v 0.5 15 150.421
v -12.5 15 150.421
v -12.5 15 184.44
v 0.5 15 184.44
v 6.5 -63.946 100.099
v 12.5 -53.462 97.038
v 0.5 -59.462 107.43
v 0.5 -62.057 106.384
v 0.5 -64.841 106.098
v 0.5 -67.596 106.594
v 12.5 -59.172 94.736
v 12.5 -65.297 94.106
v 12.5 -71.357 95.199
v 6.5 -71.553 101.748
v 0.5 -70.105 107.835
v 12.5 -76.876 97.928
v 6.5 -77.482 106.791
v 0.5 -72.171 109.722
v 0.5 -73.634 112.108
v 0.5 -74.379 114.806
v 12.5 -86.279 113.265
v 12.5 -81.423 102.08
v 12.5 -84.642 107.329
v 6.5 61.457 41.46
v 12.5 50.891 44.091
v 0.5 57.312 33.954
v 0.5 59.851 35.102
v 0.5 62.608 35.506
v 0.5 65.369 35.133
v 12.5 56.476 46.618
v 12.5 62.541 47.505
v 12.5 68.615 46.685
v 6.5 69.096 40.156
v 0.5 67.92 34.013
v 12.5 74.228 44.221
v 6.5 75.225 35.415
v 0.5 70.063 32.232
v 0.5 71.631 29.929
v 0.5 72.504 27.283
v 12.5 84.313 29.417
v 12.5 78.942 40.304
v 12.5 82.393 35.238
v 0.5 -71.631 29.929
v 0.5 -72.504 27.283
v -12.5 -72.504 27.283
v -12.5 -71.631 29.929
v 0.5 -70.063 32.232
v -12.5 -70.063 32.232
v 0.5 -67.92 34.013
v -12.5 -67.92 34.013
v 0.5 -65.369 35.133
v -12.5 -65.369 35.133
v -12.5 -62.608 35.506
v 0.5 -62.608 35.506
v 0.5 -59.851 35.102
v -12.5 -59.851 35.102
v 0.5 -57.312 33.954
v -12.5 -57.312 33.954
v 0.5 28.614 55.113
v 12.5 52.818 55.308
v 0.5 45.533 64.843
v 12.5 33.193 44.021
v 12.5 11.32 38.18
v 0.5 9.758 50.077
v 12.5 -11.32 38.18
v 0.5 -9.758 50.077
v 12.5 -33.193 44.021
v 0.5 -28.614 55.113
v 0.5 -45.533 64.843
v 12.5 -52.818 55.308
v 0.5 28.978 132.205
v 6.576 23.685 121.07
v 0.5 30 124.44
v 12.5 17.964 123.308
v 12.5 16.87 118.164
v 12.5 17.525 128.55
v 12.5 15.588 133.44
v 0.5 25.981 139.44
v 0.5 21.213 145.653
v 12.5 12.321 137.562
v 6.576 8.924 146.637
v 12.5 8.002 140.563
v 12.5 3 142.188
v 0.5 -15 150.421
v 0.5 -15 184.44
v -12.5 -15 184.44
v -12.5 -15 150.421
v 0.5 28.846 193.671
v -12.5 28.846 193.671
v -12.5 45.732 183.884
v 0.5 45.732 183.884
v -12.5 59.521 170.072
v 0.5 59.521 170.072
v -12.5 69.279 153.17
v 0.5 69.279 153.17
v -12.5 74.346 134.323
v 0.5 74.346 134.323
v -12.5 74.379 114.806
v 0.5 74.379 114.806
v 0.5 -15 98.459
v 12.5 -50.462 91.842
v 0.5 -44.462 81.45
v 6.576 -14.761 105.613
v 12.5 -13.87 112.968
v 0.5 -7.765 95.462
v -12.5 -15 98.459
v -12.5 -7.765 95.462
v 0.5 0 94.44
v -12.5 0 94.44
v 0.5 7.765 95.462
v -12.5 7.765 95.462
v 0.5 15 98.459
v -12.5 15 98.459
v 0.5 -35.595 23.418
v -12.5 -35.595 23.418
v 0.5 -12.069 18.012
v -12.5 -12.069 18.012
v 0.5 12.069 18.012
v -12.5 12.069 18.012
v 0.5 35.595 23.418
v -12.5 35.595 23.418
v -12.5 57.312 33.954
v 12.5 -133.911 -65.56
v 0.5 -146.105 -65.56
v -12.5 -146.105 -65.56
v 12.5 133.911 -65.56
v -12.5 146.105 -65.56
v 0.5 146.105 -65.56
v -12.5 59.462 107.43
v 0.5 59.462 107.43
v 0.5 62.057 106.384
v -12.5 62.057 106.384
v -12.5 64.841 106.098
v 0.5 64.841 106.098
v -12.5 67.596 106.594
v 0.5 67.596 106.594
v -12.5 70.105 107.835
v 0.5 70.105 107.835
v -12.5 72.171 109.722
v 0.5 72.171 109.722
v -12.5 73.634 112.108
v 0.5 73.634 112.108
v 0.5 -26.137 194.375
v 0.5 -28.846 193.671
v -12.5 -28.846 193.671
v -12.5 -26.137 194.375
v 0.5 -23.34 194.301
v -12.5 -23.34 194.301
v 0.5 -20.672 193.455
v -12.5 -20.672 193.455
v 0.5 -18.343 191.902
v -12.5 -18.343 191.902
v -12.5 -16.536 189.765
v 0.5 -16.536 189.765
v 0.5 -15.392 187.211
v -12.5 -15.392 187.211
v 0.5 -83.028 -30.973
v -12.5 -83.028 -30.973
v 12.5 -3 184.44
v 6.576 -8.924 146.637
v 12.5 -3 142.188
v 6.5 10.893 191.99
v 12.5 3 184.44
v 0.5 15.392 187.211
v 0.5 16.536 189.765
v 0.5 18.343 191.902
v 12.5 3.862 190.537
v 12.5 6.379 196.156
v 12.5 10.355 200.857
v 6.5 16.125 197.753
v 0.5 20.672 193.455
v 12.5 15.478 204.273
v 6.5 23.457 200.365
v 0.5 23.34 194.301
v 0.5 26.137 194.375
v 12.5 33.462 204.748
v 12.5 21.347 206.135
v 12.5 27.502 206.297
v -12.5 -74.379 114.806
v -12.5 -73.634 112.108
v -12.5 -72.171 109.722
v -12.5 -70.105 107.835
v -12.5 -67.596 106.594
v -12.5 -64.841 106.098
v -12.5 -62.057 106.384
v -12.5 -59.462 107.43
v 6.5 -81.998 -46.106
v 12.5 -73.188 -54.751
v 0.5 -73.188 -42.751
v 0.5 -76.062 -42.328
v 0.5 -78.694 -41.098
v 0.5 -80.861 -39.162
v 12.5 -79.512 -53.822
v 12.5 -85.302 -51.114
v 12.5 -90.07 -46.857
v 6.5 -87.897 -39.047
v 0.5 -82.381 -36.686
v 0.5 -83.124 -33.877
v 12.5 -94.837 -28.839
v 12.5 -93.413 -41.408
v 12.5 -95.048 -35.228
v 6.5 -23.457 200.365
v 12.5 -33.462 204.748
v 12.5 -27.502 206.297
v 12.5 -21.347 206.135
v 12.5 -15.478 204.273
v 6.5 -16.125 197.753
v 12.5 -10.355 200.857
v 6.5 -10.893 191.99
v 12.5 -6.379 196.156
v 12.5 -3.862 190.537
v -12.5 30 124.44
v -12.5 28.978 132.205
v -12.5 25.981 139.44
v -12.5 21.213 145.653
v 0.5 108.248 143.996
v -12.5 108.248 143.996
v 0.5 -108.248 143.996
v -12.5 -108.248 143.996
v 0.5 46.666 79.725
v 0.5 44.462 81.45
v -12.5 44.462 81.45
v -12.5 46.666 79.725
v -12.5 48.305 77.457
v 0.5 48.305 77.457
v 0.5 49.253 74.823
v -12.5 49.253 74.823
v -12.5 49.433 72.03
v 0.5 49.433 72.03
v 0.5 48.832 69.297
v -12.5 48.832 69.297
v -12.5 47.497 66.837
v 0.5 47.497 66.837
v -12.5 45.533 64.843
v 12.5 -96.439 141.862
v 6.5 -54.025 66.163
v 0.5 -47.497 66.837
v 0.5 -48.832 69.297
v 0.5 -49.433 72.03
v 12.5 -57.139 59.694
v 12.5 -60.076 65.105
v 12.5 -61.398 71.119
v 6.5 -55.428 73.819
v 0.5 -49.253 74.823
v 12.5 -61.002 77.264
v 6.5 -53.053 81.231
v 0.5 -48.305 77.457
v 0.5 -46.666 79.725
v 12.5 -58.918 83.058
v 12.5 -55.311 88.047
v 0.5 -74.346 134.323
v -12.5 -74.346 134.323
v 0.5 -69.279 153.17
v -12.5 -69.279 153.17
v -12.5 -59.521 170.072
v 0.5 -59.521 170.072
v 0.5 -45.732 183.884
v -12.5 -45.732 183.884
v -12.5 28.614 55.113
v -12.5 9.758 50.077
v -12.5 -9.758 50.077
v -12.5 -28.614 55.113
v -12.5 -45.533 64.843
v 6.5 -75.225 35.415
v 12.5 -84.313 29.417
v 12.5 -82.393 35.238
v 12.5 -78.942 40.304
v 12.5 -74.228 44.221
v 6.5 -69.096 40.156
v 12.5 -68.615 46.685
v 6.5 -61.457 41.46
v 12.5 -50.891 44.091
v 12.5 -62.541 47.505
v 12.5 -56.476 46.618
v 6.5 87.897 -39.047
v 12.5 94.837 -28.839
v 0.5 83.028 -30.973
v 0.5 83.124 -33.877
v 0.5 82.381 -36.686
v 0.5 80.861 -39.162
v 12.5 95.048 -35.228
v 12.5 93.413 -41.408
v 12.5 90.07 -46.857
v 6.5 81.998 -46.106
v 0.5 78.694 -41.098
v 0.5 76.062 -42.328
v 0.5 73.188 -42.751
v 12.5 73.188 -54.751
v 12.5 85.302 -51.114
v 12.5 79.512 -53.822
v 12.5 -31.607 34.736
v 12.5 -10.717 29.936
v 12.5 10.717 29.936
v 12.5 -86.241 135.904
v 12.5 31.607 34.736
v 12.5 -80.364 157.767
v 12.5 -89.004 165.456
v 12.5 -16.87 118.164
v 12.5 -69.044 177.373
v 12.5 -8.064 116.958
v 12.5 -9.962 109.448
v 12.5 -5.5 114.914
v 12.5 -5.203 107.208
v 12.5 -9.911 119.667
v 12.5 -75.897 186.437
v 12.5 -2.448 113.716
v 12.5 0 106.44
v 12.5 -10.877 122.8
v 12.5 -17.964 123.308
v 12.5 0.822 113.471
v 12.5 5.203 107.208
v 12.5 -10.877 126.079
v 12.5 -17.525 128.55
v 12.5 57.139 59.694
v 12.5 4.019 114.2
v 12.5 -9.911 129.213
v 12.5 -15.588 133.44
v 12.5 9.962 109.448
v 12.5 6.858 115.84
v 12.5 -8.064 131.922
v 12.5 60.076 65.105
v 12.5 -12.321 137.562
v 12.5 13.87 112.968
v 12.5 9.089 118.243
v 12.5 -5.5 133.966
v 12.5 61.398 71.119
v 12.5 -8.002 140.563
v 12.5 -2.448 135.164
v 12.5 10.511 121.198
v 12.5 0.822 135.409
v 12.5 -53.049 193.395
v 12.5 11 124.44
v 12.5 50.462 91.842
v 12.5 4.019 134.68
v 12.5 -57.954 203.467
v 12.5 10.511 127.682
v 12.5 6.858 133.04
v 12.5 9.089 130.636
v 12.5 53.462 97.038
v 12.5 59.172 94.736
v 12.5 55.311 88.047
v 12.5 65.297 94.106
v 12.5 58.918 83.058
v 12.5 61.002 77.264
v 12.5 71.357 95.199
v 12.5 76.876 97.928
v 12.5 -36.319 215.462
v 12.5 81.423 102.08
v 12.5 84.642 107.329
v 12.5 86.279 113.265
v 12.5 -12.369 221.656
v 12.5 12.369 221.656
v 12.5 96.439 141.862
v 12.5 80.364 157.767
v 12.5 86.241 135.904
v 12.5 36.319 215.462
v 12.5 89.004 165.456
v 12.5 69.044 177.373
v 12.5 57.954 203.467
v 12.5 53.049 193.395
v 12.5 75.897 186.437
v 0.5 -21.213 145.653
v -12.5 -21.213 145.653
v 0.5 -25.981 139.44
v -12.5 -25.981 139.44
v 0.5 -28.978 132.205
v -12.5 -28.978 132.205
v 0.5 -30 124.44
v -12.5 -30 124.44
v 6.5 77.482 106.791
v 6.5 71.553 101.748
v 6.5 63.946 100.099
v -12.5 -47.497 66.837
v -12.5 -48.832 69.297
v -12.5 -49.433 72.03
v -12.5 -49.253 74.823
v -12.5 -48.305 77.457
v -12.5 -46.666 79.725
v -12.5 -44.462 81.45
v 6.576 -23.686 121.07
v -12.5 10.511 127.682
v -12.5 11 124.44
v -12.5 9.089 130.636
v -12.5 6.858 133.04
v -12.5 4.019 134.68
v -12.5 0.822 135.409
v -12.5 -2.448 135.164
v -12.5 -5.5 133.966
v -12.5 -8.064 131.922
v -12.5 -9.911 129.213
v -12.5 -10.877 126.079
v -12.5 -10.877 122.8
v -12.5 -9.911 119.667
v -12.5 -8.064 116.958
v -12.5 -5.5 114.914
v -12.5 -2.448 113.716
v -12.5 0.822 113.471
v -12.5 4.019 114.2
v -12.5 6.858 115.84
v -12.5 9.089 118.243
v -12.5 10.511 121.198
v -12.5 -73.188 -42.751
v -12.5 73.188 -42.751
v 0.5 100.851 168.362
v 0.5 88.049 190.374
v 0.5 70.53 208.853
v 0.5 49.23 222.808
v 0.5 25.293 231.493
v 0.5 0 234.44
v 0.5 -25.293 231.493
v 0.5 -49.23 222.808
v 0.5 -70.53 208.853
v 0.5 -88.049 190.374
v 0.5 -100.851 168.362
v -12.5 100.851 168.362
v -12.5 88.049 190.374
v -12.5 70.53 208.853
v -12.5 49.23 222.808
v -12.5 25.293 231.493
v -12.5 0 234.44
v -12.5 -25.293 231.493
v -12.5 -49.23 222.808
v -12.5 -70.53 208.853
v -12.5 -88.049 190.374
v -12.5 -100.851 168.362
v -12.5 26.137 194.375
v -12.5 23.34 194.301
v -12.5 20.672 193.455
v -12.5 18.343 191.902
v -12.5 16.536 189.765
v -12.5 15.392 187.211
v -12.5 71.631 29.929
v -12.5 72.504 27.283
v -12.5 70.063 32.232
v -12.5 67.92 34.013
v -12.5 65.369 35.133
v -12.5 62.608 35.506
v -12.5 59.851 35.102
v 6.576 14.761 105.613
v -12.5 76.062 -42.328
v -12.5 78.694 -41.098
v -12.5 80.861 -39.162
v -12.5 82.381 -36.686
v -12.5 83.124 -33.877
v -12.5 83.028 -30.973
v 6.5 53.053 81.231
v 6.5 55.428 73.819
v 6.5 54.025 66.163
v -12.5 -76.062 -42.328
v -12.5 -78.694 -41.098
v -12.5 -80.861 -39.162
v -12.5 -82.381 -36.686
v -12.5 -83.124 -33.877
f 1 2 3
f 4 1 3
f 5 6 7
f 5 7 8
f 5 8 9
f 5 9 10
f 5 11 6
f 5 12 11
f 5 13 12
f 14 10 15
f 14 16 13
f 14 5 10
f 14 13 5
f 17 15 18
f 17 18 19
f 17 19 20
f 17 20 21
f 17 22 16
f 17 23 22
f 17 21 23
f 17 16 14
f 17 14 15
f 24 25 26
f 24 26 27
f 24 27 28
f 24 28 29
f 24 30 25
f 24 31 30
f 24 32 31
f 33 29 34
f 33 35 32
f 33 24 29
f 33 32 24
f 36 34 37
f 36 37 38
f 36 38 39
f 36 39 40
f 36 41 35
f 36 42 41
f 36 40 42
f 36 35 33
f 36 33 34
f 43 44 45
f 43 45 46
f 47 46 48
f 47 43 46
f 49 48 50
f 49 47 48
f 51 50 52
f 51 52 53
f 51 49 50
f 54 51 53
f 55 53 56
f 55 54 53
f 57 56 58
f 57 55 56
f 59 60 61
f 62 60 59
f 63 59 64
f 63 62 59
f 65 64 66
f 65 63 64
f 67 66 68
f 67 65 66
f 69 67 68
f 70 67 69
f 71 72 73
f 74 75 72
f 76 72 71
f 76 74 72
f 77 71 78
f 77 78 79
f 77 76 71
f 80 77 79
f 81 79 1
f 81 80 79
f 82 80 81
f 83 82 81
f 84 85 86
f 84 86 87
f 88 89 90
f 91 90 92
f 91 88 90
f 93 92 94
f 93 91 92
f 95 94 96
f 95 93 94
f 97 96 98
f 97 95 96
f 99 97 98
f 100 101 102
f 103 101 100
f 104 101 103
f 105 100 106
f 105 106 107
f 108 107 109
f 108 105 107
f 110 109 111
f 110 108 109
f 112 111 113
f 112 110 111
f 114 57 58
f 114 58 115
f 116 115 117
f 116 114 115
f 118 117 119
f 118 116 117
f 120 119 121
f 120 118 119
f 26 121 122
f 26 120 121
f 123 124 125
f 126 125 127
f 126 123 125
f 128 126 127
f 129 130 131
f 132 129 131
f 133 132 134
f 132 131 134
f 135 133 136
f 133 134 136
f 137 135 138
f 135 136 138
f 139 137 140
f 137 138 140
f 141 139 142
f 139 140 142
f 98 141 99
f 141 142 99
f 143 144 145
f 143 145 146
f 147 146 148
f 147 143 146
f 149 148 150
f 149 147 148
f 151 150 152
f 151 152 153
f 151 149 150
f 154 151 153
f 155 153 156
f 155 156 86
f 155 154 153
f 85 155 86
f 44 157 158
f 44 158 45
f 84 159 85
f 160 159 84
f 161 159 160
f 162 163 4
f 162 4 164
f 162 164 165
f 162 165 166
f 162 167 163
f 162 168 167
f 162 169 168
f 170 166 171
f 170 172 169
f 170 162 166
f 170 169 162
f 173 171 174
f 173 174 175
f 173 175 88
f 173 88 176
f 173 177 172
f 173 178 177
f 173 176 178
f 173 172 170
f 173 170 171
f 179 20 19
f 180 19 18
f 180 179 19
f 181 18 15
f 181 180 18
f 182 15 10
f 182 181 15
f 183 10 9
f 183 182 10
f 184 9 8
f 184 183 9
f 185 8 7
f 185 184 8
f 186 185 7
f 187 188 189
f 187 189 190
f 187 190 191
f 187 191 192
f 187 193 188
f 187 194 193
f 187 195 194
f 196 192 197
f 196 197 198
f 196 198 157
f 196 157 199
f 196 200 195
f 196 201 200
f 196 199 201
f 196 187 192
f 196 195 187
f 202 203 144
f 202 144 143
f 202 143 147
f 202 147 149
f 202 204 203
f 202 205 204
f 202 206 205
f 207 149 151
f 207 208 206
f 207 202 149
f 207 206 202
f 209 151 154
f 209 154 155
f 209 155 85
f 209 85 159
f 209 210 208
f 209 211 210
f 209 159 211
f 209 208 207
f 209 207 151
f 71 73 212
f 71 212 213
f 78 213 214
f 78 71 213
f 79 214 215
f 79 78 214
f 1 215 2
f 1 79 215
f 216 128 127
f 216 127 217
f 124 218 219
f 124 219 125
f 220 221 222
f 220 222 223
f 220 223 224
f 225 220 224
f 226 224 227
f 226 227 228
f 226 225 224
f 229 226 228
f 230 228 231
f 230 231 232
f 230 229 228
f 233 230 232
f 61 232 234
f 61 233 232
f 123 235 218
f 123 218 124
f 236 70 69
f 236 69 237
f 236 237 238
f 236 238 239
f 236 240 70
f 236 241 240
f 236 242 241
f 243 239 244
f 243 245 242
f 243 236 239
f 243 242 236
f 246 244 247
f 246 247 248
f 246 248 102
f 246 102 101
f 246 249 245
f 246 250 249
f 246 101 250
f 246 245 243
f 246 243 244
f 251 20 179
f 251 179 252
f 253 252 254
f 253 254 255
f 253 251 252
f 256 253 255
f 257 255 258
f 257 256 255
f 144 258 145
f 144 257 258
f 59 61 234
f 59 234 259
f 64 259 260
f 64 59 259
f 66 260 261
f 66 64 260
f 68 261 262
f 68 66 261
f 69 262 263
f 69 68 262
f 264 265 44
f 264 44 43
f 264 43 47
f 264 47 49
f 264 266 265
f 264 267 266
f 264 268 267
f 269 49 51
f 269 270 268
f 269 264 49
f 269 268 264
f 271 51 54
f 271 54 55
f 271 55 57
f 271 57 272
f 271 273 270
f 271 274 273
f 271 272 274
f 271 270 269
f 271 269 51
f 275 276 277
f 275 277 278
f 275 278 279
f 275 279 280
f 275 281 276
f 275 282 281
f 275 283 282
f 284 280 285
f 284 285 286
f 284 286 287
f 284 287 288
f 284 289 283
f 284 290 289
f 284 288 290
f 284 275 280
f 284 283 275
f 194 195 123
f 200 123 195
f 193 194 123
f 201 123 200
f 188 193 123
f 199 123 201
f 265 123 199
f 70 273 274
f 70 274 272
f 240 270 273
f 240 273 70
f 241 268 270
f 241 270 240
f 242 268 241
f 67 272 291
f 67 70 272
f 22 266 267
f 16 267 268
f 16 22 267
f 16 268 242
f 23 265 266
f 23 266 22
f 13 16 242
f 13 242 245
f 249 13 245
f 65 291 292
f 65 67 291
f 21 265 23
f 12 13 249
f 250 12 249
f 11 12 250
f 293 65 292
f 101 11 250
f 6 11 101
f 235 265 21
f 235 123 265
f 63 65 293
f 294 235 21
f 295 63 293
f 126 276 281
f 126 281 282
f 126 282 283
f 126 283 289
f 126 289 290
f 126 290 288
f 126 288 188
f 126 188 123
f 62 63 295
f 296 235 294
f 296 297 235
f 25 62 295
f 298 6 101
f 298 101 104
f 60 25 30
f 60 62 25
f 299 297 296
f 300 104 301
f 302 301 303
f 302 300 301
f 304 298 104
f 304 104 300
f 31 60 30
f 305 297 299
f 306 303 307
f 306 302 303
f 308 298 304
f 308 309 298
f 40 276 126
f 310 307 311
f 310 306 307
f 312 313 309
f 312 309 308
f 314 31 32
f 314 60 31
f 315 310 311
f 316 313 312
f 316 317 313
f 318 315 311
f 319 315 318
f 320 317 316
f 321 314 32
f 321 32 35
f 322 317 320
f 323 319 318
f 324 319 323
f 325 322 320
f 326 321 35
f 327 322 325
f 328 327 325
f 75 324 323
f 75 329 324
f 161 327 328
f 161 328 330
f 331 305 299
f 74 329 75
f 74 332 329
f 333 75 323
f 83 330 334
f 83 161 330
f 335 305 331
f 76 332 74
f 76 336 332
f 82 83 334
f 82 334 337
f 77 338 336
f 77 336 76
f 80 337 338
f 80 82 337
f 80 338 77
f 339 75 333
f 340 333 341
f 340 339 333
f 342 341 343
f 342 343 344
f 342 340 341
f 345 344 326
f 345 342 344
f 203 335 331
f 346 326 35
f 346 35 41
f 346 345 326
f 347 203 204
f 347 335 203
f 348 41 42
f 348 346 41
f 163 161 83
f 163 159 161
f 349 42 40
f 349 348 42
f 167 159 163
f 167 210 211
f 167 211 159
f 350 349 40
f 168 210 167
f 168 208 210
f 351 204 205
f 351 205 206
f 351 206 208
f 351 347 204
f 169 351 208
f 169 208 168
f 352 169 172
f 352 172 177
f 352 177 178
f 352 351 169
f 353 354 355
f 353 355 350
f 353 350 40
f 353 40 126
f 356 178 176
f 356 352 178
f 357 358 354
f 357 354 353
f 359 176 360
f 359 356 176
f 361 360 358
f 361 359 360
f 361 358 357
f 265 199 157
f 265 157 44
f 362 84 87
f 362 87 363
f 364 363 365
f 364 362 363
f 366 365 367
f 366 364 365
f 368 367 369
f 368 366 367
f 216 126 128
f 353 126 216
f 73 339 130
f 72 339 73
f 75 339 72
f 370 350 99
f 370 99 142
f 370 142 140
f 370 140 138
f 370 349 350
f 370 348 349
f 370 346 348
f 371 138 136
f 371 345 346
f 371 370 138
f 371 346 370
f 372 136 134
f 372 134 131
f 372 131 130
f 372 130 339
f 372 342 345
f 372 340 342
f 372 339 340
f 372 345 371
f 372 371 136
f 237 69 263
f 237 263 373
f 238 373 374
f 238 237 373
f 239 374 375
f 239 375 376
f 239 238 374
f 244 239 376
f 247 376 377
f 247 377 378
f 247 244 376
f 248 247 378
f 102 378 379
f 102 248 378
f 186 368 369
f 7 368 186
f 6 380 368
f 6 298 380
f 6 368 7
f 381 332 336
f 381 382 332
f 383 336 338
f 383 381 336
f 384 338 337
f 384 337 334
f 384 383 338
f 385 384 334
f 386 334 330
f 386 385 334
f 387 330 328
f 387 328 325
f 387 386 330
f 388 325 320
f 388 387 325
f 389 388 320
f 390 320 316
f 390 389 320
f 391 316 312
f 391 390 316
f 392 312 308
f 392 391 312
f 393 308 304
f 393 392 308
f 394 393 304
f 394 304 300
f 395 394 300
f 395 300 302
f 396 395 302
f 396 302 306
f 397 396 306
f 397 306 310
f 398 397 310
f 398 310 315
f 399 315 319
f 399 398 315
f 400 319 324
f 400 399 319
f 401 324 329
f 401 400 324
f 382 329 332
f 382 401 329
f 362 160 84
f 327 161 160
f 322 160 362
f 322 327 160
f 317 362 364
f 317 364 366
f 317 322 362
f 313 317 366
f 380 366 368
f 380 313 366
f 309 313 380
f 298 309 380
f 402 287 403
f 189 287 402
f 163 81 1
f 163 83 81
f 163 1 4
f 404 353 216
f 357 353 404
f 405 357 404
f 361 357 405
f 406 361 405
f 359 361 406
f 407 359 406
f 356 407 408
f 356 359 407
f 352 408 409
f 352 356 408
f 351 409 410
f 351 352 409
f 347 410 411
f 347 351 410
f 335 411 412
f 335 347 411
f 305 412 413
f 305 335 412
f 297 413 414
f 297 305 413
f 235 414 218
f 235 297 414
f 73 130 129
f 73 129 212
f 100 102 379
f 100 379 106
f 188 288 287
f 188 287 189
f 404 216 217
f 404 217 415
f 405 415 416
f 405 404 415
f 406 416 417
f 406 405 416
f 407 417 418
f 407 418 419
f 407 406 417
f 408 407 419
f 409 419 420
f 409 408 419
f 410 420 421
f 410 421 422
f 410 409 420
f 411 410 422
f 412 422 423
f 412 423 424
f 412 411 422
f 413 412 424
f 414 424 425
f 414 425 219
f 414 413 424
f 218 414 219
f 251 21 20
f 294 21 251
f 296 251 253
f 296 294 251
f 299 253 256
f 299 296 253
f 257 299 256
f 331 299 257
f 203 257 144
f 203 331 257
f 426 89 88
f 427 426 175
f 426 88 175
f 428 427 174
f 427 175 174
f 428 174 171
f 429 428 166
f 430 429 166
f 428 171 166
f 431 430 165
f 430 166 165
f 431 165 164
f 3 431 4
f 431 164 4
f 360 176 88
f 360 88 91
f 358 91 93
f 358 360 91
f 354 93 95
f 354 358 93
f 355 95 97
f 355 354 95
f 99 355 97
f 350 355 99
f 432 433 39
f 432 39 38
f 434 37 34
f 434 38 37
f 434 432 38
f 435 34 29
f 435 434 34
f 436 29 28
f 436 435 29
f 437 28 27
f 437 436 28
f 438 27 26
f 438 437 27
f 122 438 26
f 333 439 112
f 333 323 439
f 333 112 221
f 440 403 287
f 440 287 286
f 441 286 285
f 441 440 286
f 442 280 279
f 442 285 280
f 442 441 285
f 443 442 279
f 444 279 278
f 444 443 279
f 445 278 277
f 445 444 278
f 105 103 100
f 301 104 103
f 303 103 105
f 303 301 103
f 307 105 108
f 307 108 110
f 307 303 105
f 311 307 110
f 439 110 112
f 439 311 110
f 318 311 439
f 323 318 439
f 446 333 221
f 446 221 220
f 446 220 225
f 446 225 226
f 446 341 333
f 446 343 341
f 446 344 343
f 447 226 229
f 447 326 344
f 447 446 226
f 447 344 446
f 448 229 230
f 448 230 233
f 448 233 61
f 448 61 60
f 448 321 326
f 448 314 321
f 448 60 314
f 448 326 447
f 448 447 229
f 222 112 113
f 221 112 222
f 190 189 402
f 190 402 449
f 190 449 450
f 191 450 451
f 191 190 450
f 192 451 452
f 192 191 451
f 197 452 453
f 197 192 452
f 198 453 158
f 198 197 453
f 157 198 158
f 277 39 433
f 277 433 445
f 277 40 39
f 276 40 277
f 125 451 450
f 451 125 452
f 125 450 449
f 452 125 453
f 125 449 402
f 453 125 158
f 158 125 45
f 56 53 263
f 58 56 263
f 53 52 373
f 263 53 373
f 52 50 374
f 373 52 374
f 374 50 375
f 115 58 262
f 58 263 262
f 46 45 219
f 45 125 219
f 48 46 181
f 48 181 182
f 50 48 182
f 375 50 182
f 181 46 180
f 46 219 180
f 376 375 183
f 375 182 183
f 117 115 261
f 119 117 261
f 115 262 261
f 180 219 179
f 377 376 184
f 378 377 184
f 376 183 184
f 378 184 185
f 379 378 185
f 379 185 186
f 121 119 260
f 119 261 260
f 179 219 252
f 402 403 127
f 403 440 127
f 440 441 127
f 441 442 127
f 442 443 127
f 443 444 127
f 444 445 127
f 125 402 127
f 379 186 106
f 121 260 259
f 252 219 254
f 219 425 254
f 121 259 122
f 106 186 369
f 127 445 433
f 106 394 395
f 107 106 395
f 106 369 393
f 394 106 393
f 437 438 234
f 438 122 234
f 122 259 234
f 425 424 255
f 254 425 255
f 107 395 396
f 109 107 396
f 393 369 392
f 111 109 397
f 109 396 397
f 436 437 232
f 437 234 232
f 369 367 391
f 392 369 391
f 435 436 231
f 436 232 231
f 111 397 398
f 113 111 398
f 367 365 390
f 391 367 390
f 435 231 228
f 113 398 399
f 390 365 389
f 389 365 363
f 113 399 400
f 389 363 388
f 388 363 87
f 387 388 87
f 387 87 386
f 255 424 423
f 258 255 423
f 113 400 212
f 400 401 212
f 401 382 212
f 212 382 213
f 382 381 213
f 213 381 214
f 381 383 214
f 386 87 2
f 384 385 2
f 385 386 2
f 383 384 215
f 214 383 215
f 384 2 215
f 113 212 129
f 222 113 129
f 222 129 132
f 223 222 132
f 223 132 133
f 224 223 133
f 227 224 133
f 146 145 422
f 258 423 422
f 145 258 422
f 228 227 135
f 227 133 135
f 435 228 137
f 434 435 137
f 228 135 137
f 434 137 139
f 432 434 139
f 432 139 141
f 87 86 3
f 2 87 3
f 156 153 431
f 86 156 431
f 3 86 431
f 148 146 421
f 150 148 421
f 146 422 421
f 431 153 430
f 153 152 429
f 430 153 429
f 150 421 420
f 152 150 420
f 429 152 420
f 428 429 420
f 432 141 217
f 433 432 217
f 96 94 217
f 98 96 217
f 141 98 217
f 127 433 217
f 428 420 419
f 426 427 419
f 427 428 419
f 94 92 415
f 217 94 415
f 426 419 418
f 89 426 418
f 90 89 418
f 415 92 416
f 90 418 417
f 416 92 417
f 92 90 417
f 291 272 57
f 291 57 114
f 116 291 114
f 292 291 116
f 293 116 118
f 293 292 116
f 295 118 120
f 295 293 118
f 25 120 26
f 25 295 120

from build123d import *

# Parameters (mm, degrees)
F0_R     = 11
F1_DEPTH = 12.5
F2_SIZE  = 12
F3_R     = 10
F4_SIZE  = 12


# Not quite as in the source:
# - a feature names something its author has since deleted; it is built from what else it names


with BuildPart() as f1:
    # F0 (on Right) → F1 (new body, symmetric)
    with BuildSketch(Plane.YZ):
        with BuildLine():
            Line((-108.2477509669, 143.9956215311), (-146.1053743867, -65.5600531085))
            Line((-146.1053743867, -65.5600531085), (0, -65.5600531085))
            Line((0, -65.5600531085), (146.1053743867, -65.5600531085))
            Line((146.1053743867, -65.5600531085), (108.2477509669, 143.9956215311))
            ThreePointArc((108.2477509669, 143.9956215311), (0, 234.4399468915), (-108.2477509669, 143.9956215311))
        make_face()
        with BuildLine():
            Line((-85.1559906377, -42.7505690663), (-69.6519457463, 43.0699419263))
            ThreePointArc((-69.6519457463, 43.0699419263), (0, 17.3303242879), (69.6519457463, 43.0699419263))
            Line((69.6519457463, 43.0699419263), (85.1559906377, -42.7505690663))
            Line((85.1559906377, -42.7505690663), (0, -42.7505690663))
            Line((0, -42.7505690663), (-85.1559906377, -42.7505690663))
        make_face(mode=Mode.SUBTRACT)
        with BuildLine():
            ThreePointArc((56.1396103068, 74.707219693), (0, 49.4399468915), (-56.1396103068, 74.707219693))
            Line((-56.1396103068, 74.707219693), (-15, 98.459184778))
            ThreePointArc((-15, 98.459184778), (0, 94.4399468915), (15, 98.459184778))
            Line((15, 98.459184778), (56.1396103068, 74.707219693))
        make_face(mode=Mode.SUBTRACT)
        with BuildLine():
            Line((-15, 197.924639175), (-15, 150.420709005))
            ThreePointArc((-15, 150.420709005), (-25.9807621135, 139.4399468915), (-30, 124.4399468915))
            Line((-30, 124.4399468915), (-71.1396103068, 100.6879818065))
            ThreePointArc((-71.1396103068, 100.6879818065), (-64.9519052838, 161.9399468915), (-15, 197.924639175))
        make_face(mode=Mode.SUBTRACT)
        with Locations((0, 124.4399468915)):
            Circle(F0_R, mode=Mode.SUBTRACT)
        with BuildLine():
            Line((15, 150.420709005), (15, 197.924639175))
            ThreePointArc((15, 197.924639175), (64.9519052838, 161.9399468915), (71.1396103068, 100.6879818065))
            Line((71.1396103068, 100.6879818065), (30, 124.4399468915))
            ThreePointArc((30, 124.4399468915), (25.9807621135, 139.4399468915), (15, 150.420709005))
        make_face(mode=Mode.SUBTRACT)
    extrude(amount=F1_DEPTH, both=True)

    # F2
    f2_edges = [f1.edges().sort_by_distance(p)[0] for p in [
        (12.5, 0, 234.439947),
    ]]
    chamfer(f2_edges, length=F2_SIZE)

    # F3
    f3_edges = [f1.edges().sort_by_distance(p)[0] for p in [
        (0, -69.651946, 43.069942),
        (0, 69.651946, 43.069942),
        (0, -85.155991, -42.750569),
        (0, 85.155991, -42.750569),
        (0, -15, 197.924639),
        (0, 15, 197.924639),
        (0, -71.13961, 100.687982),
        (0, -56.13961, 74.70722),
        (0, 56.13961, 74.70722),
        (0, 71.13961, 100.687982),
    ]]
    fillet(f3_edges, radius=F3_R)

    # F4
    f4_edges = [f1.edges().sort_by_distance(p)[0] for p in [
        (12.5, 0, 17.330324),
        (12.5, -64.951905, 161.939947),
        (12.5, 64.951905, 161.939947),
        (12.5, 0, 49.439947),
        (12.5, -25.980762, 139.439947),
        (12.5, 0, 94.439947),
        (12.5, 25.980762, 139.439947),
    ]]
    chamfer(f4_edges, length=F4_SIZE)


solid = f1.part
